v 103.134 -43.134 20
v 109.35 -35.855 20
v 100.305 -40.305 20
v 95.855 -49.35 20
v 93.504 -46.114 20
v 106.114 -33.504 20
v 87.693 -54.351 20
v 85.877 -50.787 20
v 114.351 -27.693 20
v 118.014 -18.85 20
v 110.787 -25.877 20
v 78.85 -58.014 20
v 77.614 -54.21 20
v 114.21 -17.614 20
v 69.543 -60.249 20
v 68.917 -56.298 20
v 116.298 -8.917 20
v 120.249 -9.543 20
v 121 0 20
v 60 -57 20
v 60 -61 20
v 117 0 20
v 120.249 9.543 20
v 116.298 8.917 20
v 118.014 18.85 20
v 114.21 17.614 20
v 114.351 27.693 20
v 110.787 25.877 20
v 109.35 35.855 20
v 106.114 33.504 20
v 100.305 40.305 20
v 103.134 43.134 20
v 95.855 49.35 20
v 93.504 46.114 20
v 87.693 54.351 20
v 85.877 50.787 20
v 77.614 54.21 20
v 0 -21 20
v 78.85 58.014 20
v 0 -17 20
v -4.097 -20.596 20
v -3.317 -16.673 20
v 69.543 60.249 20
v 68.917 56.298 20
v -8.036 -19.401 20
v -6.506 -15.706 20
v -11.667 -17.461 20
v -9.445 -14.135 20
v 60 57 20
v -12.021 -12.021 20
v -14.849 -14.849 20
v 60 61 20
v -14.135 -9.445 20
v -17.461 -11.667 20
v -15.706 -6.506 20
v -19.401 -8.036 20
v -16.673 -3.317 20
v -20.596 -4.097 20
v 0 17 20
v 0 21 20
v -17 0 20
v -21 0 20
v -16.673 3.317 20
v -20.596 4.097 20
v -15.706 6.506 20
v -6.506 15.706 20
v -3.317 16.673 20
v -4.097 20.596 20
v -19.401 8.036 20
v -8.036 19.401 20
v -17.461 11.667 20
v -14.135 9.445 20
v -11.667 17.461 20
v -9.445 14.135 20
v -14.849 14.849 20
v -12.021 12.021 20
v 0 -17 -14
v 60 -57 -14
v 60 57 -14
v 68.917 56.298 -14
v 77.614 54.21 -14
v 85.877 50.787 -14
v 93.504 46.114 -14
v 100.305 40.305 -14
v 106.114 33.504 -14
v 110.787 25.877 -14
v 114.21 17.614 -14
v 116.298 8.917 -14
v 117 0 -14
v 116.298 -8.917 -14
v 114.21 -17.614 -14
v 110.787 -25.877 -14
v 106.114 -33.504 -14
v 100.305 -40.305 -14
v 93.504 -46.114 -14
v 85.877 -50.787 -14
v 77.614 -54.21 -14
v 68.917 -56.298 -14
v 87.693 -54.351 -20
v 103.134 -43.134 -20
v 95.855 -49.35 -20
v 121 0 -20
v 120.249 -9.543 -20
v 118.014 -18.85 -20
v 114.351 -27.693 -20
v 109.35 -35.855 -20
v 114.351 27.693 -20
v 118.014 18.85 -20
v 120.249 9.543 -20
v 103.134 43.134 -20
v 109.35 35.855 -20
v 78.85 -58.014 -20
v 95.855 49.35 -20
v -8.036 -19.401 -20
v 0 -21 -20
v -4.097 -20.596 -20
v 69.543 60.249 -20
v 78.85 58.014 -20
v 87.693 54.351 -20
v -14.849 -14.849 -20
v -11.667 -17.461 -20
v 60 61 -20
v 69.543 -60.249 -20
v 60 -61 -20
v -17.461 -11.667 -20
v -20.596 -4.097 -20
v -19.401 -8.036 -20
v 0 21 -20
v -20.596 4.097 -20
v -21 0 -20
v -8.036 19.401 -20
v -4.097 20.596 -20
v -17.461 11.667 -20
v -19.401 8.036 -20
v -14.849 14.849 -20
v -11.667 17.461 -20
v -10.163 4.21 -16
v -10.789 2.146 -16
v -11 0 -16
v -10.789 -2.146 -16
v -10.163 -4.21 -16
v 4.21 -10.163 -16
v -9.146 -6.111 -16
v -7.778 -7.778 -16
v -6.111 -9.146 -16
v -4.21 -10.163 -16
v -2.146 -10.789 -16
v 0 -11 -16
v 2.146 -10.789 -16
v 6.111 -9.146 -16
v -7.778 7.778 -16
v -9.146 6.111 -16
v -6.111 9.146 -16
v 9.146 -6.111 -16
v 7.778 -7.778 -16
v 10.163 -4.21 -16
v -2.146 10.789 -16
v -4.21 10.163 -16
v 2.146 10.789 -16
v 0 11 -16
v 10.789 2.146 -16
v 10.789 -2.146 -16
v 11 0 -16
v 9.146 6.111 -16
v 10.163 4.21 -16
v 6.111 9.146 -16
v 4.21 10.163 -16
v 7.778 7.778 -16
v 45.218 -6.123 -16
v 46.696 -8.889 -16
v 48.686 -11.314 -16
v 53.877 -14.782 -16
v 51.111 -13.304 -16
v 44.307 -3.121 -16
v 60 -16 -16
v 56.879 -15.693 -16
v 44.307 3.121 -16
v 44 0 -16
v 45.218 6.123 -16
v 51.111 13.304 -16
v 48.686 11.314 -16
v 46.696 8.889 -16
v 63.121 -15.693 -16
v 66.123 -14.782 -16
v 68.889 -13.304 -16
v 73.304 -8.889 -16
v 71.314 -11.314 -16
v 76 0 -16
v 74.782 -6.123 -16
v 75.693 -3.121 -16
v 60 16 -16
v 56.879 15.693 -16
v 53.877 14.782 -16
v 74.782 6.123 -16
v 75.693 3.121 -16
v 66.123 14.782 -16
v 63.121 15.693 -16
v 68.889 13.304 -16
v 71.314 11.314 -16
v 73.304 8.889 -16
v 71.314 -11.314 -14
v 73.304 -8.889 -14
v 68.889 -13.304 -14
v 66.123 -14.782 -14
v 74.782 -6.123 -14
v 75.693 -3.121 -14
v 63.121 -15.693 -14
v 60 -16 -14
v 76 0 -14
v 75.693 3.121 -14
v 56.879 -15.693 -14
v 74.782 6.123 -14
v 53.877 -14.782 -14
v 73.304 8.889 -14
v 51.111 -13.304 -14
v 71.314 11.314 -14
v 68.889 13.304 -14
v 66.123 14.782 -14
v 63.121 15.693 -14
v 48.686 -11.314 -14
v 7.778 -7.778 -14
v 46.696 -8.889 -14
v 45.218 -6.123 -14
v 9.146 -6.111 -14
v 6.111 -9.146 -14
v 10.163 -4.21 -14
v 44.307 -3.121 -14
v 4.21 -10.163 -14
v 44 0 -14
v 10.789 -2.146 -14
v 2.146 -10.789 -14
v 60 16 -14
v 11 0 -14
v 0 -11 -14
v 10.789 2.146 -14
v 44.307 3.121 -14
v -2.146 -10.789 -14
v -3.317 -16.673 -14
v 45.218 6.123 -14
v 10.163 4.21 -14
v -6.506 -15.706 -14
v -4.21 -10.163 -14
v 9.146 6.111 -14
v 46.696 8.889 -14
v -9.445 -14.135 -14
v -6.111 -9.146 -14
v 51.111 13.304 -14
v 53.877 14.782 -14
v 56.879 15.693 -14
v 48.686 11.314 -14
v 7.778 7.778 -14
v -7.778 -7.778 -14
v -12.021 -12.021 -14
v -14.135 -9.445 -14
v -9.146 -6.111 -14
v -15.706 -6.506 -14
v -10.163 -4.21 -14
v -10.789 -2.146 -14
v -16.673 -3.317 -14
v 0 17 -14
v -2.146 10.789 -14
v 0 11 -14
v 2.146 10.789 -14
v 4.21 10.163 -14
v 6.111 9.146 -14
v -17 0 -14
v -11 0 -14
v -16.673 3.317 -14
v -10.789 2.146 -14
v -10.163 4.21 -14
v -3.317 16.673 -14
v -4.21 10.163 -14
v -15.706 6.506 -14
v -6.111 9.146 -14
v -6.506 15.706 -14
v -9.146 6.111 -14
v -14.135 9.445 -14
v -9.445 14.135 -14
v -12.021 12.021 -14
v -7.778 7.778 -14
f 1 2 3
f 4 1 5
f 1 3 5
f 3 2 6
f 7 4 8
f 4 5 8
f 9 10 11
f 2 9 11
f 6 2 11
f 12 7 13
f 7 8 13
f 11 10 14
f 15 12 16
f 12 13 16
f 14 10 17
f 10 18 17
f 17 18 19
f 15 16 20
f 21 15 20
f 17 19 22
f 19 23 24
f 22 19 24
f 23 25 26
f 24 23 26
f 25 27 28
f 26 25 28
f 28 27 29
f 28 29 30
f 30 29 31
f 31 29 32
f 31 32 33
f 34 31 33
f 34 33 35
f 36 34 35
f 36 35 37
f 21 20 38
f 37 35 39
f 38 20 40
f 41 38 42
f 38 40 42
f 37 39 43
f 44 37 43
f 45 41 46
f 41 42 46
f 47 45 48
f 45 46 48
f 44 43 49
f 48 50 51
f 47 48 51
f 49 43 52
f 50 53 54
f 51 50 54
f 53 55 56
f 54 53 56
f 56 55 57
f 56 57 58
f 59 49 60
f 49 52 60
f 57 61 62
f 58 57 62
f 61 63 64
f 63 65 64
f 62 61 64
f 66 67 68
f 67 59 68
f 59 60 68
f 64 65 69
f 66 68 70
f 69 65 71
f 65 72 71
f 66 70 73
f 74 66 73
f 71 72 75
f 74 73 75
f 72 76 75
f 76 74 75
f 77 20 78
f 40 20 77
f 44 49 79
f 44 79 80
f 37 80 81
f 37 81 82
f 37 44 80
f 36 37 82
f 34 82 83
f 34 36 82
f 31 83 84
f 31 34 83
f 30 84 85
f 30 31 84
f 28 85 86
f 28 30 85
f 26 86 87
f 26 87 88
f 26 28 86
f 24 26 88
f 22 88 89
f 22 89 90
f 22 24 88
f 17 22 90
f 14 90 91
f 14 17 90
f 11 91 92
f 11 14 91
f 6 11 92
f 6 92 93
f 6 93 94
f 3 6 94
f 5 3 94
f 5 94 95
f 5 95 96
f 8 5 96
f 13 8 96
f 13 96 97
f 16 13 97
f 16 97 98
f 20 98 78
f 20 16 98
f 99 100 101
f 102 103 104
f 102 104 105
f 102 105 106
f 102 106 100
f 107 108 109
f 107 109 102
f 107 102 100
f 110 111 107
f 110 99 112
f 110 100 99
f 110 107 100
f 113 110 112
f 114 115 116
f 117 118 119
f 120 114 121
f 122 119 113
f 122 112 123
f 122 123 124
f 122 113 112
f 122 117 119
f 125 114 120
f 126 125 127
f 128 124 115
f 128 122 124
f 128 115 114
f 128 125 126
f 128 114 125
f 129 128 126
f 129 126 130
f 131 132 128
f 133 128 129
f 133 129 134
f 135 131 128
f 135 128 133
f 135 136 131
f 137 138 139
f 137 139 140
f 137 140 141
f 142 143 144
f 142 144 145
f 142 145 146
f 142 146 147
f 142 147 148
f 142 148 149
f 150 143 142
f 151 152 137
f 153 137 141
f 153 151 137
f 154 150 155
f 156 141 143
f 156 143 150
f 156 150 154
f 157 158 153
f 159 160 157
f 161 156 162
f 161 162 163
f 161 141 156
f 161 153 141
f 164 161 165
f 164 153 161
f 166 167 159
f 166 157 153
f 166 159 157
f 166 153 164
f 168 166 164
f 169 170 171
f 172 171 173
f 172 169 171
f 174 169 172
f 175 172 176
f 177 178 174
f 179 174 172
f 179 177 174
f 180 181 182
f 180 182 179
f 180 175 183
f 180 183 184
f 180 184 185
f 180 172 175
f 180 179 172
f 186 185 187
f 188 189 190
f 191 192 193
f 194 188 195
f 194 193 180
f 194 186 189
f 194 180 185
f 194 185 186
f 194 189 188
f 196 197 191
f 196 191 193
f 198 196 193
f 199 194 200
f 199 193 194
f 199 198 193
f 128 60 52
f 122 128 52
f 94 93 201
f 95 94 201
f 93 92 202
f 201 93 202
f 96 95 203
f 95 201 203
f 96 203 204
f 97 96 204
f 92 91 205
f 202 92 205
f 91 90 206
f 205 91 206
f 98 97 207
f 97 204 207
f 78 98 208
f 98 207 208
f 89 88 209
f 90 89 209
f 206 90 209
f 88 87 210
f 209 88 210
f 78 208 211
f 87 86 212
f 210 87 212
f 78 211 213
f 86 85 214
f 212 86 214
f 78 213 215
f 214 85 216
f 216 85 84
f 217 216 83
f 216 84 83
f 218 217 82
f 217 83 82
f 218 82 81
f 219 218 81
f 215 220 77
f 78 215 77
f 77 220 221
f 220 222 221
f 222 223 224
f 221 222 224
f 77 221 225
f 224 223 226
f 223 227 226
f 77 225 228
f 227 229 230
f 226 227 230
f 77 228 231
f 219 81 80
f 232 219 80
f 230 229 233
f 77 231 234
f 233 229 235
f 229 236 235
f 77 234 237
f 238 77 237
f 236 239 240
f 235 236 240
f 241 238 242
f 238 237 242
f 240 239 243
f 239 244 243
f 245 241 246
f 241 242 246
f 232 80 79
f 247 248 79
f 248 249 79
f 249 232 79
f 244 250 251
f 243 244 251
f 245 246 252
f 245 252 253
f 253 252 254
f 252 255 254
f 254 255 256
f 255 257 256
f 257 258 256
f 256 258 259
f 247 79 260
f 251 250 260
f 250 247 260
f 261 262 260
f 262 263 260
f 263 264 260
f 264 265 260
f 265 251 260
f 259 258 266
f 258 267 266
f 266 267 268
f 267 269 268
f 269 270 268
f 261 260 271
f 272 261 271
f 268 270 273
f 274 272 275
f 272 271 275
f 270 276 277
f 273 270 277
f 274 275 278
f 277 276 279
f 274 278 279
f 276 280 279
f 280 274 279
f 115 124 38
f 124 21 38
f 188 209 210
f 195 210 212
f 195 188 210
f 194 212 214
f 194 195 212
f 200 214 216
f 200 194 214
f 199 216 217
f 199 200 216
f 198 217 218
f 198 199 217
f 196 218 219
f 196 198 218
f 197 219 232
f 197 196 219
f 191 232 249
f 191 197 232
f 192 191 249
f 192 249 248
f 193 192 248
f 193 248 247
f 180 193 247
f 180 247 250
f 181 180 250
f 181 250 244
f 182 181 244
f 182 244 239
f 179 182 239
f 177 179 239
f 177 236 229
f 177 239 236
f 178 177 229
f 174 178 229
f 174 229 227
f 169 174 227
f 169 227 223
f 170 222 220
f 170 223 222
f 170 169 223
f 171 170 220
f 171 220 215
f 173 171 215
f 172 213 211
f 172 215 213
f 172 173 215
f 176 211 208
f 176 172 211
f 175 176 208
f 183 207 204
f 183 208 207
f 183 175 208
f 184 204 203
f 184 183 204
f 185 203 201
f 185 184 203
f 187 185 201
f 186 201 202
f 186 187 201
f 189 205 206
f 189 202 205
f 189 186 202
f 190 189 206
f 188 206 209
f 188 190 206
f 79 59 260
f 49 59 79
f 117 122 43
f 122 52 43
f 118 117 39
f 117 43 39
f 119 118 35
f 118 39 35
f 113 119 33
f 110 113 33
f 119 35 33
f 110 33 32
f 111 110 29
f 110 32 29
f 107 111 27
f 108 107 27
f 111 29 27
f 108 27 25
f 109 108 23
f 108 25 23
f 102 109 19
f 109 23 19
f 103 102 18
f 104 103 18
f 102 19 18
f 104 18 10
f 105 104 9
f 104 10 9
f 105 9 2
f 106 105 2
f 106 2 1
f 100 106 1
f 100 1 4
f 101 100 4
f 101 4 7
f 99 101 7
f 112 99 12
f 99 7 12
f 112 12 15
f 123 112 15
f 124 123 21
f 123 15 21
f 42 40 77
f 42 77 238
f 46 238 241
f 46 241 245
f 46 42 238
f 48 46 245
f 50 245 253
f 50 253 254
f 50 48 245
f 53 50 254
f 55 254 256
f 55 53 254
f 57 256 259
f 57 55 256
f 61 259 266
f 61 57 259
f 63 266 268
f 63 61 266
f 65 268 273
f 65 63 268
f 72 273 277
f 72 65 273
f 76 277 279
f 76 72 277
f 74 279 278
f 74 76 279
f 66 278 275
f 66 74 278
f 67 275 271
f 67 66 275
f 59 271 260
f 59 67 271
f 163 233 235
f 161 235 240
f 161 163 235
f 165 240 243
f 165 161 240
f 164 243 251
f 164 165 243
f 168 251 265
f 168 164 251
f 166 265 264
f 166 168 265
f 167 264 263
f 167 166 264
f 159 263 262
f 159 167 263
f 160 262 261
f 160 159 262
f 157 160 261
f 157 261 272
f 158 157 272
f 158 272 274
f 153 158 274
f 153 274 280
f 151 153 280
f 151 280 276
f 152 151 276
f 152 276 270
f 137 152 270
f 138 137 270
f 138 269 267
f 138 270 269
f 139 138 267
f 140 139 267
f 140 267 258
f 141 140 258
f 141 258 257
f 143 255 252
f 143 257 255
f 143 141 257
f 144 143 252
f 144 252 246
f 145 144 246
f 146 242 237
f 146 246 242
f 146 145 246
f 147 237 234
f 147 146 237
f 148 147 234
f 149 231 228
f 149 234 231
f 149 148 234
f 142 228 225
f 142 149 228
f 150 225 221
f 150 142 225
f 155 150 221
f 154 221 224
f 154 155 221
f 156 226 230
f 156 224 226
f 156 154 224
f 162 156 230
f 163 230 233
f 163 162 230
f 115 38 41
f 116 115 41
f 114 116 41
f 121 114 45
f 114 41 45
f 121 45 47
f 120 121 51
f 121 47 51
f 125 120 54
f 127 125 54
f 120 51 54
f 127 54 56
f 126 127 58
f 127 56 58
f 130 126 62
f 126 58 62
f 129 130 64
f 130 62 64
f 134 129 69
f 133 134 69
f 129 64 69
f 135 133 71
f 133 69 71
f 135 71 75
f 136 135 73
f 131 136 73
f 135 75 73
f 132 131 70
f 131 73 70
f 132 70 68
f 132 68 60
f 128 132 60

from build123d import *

# Parameters (mm, degrees)
BOSS_EXTRU_1_DEPTH           = 20
ENL_V_MAT_EXTRU_1_DEPTH      = 34
ENL_V_MAT_EXTRU_2_DEPTH      = 140.70683591
ENL_V_MAT_EXTRU_2_DEPTH_BACK = 2
ESQUISSE3_R                  = 11
ESQUISSE3_R_2                = 16


with BuildPart() as part:
    # Esquisse1 → Boss.-Extru.1 (new, symmetric)
    with BuildSketch(Plane.XY):
        with BuildLine():
            Line((0, 21), (60, 61))
            ThreePointArc((60, 61), (121, 0), (60, -61))
            Line((60, -61), (0, -21))
            ThreePointArc((0, -21), (-21, 0), (0, 21))
        make_face()
    extrude(amount=BOSS_EXTRU_1_DEPTH, both=True)

    # Esquisse2 → Enlèv. mat.-Extru.1 (cut)
    with BuildSketch(Plane.XY.offset(20)):
        with BuildLine():
            Line((0, 17), (60, 57))
            ThreePointArc((60, 57), (117, 0), (60, -57))
            Line((60, -57), (0, -17))
            ThreePointArc((0, -17), (-17, 0), (0, 17))
        make_face()
    extrude(amount=-ENL_V_MAT_EXTRU_1_DEPTH, mode=Mode.SUBTRACT)

    # Esquisse3 → Enlèv. mat.-Extru.2 (cut, two sides: drawn at the far end of the back side and taken through both)
    with BuildSketch(Plane.XY.offset(-14).offset(-ENL_V_MAT_EXTRU_2_DEPTH_BACK)):
        Circle(ESQUISSE3_R)
        with Locations((60, 0)):
            Circle(ESQUISSE3_R_2)
    extrude(amount=ENL_V_MAT_EXTRU_2_DEPTH + ENL_V_MAT_EXTRU_2_DEPTH_BACK, mode=Mode.SUBTRACT)


solid = part.part
